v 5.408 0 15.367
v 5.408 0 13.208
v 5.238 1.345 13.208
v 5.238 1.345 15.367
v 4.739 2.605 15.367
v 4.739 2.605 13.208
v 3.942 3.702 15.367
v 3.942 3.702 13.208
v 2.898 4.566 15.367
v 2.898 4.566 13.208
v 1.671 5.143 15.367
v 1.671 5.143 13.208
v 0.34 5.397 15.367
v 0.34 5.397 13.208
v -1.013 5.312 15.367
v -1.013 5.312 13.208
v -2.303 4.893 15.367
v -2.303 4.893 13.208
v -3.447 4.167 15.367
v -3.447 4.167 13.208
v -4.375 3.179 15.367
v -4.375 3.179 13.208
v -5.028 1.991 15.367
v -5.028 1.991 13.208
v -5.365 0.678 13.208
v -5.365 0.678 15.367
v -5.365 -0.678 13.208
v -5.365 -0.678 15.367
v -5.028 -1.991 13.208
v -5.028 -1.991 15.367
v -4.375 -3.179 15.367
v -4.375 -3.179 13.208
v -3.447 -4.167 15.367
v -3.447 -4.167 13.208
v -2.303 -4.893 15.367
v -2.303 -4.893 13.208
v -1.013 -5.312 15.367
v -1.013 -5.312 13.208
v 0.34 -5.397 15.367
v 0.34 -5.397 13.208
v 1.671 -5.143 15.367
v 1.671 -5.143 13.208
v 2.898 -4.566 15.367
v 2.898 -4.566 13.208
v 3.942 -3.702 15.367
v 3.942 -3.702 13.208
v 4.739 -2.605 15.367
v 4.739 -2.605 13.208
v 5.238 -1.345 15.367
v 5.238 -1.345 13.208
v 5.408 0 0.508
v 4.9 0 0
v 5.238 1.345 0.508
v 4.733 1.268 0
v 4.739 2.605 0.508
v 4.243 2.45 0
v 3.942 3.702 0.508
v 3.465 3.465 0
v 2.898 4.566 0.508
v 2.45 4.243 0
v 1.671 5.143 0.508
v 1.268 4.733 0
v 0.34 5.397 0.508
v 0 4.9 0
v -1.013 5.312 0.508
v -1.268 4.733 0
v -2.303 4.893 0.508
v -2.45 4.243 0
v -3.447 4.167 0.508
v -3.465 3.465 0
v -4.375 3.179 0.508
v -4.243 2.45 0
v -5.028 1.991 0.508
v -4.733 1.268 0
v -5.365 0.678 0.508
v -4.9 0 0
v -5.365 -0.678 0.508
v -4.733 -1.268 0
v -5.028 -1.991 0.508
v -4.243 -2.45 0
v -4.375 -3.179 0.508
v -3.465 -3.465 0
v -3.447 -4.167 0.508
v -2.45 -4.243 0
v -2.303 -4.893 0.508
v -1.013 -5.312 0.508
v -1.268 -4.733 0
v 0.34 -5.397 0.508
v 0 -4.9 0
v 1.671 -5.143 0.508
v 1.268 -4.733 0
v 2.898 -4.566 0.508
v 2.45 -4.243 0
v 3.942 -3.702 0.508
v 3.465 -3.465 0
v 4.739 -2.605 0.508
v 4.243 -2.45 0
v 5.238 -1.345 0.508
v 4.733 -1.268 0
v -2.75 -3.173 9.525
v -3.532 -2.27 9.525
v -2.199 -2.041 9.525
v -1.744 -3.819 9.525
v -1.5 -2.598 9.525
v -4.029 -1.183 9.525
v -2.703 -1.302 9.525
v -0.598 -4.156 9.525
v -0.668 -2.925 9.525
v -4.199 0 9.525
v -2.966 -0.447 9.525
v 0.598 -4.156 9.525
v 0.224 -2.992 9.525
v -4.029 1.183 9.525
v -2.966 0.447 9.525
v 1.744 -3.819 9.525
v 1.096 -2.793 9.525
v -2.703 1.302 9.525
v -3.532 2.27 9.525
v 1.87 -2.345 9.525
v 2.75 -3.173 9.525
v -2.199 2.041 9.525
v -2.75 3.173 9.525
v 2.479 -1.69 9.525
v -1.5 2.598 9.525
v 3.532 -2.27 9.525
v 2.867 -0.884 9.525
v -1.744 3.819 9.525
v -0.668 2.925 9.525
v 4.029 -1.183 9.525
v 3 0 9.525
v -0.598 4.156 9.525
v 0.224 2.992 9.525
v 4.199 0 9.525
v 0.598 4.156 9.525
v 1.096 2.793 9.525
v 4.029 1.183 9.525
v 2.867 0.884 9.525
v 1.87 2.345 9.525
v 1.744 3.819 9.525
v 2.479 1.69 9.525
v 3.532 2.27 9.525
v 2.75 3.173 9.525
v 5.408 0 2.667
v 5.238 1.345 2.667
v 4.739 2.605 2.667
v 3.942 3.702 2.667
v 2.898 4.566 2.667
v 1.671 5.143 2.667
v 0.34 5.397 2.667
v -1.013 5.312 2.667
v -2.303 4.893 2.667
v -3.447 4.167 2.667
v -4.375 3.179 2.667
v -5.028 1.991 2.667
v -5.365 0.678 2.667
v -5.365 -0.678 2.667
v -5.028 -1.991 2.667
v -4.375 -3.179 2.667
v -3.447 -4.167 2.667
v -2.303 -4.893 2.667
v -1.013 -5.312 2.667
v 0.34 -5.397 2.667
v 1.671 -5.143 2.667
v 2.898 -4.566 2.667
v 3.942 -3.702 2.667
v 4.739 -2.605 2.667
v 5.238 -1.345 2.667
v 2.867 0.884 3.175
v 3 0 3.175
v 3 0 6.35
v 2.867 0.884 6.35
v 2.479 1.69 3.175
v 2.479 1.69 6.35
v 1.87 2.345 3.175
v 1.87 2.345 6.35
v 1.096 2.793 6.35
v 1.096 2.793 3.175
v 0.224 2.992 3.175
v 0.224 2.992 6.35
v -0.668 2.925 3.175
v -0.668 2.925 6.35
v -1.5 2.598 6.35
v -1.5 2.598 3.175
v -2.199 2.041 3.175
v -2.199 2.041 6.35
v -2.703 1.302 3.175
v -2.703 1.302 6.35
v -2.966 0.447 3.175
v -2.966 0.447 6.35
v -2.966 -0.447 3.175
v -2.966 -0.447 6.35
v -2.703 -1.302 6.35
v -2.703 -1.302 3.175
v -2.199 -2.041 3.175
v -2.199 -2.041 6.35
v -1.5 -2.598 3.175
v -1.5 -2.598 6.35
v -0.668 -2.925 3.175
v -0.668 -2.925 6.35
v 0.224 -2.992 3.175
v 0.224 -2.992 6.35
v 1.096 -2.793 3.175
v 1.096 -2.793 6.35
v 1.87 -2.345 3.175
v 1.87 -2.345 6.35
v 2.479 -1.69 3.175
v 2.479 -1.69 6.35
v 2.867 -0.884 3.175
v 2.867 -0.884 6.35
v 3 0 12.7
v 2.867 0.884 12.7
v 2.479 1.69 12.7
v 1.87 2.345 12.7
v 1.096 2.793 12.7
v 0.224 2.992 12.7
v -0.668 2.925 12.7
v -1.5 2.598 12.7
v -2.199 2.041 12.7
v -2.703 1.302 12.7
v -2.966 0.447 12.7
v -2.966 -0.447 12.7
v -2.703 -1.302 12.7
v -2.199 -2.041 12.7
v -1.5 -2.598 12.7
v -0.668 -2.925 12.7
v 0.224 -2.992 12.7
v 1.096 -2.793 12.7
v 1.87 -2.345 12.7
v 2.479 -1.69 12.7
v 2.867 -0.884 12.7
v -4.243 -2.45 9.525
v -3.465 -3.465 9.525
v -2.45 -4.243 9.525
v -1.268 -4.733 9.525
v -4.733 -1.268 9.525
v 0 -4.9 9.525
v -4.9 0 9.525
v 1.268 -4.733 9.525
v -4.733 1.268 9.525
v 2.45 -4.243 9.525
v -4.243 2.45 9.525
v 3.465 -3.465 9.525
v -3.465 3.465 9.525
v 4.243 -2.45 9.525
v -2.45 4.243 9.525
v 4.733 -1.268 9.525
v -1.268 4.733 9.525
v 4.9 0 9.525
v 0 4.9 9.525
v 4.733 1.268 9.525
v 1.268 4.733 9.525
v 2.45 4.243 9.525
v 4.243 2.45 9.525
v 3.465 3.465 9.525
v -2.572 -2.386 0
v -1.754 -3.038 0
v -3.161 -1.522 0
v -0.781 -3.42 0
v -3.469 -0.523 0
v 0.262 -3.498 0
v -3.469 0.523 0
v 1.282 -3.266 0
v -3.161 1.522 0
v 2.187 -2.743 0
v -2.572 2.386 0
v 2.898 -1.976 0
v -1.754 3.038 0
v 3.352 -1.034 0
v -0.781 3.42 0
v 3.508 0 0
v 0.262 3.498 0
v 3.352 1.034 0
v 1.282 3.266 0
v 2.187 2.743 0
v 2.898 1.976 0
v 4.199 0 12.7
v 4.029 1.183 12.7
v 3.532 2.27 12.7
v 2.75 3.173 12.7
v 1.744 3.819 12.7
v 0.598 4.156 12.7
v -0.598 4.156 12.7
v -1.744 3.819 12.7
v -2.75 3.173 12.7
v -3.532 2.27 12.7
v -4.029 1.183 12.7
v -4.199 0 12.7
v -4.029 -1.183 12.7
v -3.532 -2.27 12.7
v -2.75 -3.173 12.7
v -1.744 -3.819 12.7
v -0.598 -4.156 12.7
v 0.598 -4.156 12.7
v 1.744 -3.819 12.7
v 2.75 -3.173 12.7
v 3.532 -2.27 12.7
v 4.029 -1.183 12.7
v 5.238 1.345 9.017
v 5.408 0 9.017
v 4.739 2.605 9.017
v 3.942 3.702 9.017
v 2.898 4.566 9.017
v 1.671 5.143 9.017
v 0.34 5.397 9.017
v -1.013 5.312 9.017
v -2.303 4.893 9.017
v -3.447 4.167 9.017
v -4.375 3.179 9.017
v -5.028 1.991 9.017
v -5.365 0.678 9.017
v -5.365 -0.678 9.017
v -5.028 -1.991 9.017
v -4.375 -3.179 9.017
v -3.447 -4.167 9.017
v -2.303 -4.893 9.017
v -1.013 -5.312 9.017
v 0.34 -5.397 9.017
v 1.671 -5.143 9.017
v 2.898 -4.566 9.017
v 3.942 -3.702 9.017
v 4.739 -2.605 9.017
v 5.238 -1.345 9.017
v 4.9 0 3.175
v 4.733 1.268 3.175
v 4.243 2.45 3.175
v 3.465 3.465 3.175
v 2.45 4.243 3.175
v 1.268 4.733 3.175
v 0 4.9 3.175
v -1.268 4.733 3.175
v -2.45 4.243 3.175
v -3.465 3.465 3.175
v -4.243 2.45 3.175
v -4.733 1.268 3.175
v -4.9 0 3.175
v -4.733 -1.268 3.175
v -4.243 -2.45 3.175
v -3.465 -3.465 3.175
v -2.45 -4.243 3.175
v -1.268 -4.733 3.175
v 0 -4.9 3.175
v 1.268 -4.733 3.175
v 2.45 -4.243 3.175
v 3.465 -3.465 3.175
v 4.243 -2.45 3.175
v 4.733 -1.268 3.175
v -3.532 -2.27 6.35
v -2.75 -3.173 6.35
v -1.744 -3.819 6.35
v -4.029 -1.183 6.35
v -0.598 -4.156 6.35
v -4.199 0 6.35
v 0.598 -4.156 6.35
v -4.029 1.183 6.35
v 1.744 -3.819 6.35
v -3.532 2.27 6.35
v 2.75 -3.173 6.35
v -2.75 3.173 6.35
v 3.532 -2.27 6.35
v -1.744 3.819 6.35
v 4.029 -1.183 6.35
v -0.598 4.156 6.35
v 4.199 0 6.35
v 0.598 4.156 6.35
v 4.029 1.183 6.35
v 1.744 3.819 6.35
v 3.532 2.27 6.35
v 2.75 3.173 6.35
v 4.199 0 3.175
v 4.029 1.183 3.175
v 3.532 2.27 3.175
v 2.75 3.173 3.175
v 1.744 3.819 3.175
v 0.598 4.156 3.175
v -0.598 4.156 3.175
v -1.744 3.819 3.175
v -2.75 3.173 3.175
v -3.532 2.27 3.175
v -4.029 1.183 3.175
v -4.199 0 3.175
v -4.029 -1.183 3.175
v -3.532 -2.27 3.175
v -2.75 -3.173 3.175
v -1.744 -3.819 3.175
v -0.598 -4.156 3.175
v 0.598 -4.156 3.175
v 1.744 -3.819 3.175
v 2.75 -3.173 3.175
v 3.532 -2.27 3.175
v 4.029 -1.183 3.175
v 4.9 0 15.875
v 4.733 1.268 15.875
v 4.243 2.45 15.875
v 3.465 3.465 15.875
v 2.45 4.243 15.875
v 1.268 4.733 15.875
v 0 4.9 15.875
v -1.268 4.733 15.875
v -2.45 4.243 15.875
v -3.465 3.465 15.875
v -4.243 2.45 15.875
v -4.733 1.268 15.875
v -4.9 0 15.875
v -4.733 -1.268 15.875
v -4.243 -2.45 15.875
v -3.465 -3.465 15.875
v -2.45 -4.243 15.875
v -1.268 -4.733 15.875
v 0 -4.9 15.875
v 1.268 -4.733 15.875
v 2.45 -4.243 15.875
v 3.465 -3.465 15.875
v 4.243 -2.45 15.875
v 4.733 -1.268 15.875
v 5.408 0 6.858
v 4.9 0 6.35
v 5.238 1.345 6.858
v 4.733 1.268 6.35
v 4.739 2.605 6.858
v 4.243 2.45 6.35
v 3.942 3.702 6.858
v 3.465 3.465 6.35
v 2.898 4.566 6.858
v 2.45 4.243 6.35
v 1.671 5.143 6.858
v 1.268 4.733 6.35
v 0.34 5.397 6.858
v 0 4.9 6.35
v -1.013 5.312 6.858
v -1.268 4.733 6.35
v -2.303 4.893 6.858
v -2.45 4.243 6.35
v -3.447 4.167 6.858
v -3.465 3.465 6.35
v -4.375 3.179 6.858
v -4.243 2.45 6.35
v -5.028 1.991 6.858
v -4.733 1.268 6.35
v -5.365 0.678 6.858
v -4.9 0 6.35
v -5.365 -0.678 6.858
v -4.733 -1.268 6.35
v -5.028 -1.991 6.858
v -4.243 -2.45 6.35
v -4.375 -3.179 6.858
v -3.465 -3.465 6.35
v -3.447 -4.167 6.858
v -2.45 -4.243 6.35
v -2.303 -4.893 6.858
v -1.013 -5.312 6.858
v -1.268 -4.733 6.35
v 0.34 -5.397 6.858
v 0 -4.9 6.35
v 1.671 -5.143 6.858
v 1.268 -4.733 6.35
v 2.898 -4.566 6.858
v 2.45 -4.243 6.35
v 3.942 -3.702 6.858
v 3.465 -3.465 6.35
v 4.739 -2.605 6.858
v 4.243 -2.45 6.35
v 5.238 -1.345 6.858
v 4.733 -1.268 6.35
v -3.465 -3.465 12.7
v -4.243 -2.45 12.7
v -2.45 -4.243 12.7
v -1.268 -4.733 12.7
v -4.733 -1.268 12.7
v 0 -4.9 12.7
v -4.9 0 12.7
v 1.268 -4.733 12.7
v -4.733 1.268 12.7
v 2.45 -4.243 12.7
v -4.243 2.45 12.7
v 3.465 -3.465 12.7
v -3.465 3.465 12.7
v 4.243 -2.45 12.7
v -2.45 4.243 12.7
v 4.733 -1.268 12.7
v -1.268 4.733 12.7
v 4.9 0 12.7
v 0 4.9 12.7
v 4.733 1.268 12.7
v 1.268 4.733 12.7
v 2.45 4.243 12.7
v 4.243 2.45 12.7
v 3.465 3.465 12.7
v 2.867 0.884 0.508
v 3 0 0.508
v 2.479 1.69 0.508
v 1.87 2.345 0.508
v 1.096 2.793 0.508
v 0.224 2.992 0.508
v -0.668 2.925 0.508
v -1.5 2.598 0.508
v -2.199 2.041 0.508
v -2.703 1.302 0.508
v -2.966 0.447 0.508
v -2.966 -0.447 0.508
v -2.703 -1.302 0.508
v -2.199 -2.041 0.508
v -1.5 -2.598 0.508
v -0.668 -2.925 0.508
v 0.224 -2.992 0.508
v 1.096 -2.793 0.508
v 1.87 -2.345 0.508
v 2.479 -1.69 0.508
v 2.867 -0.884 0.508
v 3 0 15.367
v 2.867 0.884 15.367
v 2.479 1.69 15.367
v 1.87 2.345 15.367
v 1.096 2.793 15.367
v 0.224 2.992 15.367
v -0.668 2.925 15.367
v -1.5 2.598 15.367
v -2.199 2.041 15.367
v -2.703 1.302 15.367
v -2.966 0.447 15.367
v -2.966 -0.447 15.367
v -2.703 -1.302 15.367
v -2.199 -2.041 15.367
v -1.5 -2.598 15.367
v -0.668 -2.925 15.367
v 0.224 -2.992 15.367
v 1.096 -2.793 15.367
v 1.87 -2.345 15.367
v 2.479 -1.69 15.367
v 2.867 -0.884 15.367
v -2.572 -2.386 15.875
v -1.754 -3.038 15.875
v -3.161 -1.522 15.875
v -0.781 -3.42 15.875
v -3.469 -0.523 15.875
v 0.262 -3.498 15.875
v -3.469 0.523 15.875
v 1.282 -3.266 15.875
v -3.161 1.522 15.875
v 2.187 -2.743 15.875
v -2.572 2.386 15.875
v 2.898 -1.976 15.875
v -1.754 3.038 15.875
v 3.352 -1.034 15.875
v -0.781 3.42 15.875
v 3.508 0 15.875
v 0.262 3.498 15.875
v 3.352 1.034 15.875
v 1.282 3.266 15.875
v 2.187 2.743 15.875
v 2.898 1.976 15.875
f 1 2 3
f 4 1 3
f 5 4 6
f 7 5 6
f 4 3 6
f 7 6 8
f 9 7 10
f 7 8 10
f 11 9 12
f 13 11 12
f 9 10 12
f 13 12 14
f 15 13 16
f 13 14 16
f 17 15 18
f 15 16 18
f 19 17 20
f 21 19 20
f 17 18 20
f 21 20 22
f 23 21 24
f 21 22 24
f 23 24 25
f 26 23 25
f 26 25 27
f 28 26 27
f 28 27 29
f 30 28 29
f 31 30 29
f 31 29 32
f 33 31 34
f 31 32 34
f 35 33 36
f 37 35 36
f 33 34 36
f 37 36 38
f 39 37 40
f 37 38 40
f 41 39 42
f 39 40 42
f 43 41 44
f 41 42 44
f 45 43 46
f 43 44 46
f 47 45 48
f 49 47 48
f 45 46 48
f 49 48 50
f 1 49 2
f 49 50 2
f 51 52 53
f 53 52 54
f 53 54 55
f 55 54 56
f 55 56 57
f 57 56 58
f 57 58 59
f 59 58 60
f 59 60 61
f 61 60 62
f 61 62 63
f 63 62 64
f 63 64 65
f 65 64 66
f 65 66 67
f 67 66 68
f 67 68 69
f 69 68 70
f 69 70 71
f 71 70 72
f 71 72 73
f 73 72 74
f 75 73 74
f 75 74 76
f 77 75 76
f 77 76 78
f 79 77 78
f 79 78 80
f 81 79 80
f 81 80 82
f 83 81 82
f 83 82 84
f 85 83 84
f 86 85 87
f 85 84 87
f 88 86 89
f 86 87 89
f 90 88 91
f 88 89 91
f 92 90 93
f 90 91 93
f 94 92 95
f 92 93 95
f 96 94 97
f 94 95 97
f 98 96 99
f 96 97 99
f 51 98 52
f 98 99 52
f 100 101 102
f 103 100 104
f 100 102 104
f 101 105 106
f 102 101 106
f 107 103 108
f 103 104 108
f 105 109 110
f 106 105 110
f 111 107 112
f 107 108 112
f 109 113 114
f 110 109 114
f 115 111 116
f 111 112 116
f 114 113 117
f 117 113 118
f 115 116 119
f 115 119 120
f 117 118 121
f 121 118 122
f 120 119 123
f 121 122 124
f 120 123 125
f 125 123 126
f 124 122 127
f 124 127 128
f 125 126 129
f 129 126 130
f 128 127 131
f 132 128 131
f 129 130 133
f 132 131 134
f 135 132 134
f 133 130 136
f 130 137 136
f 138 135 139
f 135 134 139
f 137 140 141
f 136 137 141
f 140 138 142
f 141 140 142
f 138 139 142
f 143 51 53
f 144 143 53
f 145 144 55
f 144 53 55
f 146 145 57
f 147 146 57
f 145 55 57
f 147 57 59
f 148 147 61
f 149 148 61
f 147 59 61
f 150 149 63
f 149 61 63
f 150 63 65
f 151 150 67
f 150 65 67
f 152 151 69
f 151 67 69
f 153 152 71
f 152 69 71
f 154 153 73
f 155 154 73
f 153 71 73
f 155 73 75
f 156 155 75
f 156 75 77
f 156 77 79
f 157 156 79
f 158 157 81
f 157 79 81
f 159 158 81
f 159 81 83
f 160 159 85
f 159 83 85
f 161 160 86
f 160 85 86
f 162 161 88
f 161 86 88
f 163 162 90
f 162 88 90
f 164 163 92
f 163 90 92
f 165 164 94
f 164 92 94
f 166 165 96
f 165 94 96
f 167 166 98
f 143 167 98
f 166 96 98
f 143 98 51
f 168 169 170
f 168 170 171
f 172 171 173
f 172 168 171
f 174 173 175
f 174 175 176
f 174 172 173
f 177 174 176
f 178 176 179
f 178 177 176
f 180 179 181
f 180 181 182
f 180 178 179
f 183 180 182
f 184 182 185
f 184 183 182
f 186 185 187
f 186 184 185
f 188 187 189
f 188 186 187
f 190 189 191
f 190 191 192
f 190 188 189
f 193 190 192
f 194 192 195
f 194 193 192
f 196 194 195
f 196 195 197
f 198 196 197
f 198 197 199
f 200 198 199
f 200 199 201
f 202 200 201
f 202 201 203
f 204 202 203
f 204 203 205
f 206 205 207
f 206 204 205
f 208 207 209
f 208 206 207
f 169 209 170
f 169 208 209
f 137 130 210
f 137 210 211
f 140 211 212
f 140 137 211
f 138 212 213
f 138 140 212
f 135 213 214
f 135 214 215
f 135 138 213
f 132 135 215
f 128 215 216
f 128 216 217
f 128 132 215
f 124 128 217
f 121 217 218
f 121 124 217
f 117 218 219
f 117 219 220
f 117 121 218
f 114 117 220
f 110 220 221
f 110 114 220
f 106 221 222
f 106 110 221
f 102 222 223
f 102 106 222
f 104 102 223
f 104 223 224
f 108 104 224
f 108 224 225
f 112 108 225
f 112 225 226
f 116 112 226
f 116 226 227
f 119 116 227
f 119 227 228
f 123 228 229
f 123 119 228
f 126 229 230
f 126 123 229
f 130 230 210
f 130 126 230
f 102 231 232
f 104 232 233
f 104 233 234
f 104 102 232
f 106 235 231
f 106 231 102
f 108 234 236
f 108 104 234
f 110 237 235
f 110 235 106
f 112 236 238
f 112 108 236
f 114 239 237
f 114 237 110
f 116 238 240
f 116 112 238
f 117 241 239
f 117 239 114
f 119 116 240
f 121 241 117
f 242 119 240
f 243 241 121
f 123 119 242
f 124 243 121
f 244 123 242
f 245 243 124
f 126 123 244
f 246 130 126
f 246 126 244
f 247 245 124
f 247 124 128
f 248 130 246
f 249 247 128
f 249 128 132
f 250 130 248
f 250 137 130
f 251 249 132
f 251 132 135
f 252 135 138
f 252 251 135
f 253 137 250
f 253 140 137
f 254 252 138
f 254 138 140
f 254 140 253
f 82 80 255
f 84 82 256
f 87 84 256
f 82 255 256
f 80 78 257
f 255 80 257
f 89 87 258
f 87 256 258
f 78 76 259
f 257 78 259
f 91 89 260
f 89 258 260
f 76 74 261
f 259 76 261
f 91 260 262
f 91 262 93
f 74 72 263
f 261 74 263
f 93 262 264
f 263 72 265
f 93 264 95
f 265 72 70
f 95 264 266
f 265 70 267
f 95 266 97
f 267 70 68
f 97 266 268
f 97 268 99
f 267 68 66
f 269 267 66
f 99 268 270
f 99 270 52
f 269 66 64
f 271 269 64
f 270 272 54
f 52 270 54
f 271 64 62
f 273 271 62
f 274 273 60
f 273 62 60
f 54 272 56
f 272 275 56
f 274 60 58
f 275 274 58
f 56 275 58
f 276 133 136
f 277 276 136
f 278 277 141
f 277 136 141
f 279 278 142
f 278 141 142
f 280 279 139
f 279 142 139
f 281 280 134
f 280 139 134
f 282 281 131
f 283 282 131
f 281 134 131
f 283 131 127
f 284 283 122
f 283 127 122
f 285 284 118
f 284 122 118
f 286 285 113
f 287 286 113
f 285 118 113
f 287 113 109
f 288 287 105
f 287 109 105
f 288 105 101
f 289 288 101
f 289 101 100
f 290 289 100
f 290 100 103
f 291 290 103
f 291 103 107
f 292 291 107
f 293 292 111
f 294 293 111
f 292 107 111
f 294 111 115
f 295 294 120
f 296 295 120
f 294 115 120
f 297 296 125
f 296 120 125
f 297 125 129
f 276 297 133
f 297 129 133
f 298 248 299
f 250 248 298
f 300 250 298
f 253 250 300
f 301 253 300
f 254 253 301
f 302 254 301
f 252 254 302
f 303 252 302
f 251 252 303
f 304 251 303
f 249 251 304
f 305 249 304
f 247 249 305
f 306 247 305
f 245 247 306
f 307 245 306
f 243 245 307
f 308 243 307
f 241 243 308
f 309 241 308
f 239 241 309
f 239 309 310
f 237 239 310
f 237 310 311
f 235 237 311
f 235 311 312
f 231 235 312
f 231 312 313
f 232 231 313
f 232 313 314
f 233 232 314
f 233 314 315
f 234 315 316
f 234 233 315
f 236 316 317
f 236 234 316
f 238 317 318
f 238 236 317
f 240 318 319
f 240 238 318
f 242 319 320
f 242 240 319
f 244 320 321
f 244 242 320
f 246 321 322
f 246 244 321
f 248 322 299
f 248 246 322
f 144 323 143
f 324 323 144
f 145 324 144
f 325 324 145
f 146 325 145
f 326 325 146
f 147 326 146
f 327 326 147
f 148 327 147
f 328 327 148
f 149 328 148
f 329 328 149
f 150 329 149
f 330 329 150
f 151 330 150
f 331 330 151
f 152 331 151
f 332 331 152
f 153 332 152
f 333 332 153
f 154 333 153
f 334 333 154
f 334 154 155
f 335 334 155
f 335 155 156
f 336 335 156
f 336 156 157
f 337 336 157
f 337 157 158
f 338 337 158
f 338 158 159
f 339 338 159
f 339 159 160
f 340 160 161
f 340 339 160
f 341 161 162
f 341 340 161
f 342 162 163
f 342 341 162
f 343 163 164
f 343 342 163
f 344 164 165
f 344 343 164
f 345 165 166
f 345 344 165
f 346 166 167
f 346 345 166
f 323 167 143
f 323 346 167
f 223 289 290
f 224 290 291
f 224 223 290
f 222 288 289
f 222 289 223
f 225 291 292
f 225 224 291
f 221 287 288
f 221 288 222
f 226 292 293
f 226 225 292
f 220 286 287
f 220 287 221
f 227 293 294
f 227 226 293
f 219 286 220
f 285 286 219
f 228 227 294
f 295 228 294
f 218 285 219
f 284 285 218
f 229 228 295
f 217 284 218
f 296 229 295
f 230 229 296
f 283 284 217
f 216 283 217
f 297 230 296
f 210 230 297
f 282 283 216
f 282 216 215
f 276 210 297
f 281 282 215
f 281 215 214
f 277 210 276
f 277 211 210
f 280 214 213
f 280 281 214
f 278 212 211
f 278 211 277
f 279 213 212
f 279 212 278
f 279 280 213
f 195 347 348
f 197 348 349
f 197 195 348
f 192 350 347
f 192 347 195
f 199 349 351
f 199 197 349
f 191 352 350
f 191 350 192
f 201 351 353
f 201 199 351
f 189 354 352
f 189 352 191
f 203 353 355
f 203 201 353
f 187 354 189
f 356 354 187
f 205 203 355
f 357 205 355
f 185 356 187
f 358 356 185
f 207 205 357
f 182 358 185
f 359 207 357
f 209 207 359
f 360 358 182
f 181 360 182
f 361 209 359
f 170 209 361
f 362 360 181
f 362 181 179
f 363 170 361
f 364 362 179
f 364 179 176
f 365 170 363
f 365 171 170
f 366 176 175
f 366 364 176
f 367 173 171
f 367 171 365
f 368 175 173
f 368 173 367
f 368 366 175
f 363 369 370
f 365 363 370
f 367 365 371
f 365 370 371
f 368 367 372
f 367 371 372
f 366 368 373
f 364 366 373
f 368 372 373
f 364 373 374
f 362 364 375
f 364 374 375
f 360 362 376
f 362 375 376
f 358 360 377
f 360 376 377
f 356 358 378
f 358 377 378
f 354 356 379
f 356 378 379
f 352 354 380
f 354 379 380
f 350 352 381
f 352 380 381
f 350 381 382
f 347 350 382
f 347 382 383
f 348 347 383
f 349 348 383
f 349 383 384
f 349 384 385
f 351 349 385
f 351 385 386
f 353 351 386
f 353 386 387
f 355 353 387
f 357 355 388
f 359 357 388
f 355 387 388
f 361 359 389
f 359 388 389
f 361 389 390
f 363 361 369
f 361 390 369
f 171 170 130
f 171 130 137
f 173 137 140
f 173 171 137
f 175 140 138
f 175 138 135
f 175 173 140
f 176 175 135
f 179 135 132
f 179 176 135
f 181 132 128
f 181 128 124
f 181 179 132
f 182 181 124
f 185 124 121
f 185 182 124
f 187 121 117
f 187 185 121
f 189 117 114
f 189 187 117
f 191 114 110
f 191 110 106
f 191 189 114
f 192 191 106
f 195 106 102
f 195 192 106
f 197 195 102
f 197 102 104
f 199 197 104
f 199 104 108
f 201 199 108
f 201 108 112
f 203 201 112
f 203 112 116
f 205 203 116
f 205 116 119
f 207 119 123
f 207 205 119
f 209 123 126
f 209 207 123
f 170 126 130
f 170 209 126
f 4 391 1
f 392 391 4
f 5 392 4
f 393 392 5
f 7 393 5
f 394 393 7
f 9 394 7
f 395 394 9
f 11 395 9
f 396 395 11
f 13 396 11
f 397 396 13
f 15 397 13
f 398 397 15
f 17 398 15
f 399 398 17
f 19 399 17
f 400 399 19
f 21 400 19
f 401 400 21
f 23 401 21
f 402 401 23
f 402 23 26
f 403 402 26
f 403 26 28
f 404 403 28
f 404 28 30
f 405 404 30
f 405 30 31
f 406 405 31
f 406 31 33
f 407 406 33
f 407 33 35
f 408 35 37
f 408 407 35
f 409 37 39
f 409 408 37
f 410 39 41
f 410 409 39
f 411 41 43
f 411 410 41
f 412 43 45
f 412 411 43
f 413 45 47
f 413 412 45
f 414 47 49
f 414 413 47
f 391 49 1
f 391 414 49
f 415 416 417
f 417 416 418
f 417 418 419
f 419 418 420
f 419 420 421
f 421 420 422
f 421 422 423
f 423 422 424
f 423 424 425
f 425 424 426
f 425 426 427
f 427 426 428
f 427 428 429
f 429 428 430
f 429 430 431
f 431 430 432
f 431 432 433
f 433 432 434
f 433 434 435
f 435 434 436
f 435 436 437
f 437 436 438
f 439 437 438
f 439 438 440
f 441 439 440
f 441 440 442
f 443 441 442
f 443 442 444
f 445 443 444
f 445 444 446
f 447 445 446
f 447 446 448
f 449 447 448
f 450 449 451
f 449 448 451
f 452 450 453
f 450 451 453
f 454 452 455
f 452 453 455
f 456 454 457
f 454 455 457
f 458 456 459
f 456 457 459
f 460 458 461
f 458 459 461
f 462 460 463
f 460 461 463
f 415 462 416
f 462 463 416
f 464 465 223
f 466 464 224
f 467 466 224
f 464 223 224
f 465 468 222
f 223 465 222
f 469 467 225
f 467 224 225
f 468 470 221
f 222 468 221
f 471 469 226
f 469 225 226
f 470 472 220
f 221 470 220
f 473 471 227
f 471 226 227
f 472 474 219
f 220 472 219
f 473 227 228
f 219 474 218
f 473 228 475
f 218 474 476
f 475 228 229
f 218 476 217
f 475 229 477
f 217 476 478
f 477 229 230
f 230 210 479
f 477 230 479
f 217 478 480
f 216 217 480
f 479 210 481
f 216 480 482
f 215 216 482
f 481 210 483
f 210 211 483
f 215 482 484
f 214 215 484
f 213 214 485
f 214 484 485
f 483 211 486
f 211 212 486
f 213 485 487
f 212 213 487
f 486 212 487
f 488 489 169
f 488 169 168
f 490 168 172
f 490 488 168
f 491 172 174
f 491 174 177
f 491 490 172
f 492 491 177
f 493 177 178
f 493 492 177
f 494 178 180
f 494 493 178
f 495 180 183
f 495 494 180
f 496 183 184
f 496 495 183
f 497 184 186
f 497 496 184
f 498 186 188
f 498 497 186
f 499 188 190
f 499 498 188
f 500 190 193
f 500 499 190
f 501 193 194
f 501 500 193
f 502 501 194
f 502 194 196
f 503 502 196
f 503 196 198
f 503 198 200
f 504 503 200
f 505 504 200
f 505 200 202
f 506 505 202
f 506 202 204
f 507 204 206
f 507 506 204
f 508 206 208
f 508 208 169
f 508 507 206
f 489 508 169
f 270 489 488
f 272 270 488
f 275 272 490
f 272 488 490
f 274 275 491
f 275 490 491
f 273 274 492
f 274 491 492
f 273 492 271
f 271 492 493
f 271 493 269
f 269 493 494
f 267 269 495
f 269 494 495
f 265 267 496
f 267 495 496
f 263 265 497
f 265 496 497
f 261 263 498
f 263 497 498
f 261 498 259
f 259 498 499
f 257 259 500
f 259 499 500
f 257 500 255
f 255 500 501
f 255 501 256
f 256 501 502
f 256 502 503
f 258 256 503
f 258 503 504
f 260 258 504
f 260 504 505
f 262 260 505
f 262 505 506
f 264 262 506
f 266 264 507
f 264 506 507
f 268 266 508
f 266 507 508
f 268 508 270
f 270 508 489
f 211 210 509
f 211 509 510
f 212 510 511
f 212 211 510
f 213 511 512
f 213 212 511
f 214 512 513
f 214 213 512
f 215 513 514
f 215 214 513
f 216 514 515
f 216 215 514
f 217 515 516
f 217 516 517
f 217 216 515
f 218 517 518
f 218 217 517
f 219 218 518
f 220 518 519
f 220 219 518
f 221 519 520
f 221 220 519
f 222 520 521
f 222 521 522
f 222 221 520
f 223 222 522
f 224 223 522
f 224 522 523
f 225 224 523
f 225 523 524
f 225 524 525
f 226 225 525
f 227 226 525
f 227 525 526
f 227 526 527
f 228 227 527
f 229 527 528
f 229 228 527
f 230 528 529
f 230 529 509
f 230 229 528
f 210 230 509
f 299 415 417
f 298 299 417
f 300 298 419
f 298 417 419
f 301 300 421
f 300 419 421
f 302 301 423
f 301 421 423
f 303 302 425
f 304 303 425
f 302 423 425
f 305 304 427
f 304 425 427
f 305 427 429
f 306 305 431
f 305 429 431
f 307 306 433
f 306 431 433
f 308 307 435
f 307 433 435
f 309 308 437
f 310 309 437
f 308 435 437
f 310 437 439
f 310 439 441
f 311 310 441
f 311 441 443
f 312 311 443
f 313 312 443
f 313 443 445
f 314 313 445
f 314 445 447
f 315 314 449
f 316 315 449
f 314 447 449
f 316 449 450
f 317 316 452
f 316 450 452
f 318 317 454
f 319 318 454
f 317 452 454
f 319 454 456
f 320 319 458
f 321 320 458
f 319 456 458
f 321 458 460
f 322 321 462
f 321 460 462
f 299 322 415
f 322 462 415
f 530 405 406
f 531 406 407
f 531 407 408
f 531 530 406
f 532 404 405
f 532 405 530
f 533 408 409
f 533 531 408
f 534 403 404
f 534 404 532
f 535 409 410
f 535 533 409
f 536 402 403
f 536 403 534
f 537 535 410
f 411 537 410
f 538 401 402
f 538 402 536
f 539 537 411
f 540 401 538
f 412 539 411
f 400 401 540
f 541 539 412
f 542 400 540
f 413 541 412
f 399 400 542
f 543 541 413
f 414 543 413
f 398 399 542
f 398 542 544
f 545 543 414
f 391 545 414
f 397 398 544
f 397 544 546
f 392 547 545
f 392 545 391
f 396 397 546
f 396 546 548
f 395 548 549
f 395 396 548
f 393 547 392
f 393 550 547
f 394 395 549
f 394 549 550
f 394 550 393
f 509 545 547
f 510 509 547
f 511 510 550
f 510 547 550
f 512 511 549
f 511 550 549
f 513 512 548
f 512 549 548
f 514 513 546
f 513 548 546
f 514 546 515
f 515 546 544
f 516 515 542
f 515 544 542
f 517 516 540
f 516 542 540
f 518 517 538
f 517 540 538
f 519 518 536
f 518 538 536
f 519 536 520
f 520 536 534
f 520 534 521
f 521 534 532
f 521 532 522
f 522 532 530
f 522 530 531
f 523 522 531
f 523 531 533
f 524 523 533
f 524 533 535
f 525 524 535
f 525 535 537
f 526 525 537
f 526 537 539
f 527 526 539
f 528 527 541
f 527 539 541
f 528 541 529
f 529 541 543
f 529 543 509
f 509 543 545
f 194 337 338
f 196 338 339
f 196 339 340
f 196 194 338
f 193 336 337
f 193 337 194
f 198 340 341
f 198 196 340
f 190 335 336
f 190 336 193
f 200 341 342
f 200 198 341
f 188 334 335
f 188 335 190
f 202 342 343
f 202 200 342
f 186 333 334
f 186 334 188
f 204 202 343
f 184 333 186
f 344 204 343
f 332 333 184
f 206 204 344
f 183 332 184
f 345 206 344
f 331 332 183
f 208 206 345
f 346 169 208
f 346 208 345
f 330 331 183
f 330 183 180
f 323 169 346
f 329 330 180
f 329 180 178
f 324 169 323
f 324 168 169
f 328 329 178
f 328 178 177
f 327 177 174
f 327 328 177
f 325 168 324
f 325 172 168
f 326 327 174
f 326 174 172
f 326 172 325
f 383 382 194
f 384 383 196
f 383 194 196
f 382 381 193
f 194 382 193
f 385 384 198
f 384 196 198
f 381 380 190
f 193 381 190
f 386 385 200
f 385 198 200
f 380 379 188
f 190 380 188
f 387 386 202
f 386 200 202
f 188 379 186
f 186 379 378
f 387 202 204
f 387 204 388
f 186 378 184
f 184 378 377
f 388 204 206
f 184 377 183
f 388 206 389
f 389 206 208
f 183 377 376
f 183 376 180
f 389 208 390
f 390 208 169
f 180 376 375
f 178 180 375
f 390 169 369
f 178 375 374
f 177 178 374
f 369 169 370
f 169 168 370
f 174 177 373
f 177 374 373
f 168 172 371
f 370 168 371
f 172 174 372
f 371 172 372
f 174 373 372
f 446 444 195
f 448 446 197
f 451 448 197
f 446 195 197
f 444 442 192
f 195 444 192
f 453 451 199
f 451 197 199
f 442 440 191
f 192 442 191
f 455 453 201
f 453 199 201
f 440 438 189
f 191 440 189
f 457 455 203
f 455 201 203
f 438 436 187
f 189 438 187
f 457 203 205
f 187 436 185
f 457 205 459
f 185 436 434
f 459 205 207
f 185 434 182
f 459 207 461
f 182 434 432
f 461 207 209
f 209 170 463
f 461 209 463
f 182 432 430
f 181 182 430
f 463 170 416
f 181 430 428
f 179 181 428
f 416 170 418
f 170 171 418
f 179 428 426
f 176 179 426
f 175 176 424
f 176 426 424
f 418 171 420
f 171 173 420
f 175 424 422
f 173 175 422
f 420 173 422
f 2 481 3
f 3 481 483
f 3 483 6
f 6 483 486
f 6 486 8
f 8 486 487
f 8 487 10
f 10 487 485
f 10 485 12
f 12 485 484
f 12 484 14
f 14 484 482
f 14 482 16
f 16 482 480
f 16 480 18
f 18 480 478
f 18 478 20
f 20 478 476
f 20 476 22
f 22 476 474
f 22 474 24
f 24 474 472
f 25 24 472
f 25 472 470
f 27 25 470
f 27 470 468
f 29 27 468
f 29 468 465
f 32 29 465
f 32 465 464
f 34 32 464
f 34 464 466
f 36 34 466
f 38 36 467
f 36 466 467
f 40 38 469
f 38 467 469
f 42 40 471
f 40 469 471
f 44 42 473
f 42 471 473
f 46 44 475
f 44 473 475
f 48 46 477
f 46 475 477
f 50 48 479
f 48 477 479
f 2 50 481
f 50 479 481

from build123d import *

# Parameters (mm, degrees)
F0_R       = 5.4077606055
F0_R_2     = 4.1986607111
F0_R_3     = 3
F1_DEPTH   = 3.175
F3_DEPTH   = 3.175
F5_DEPTH   = 3.175
F7_DEPTH   = 3.175
F9_DEPTH   = 3.175
F14_SIZE   = 0.508
F14_2_SIZE = 0.508
F14_3_SIZE = 0.508
F15_SIZE   = 0.508
F15_2_SIZE = 0.508


with BuildPart() as f1:
    # F0 (on Top) → F1 (new body)
    with BuildSketch(Plane.XY):
        Circle(F0_R)
        Circle(F0_R_2, mode=Mode.SUBTRACT)
        Circle(F0_R_2)
        Circle(F0_R_3, mode=Mode.SUBTRACT)
    extrude(amount=F1_DEPTH)


with BuildPart() as f1_1:
    # F2: moved
    add(f1.part.moved(Location((0, 0, 15.875))))


with BuildPart() as f3:
    # F0 (on Top) → F3 (new body)
    with BuildSketch(Plane.XY):
        Circle(F0_R_2)
        Circle(F0_R_3, mode=Mode.SUBTRACT)
    extrude(amount=F3_DEPTH)


with BuildPart() as f3_1:
    # F4: moved
    add(f3.part.moved(Location((0, 0, 12.7))))


with BuildPart() as f5:
    # F0 (on Top) → F5 (new body)
    with BuildSketch(Plane.XY):
        Circle(F0_R)
        Circle(F0_R_2, mode=Mode.SUBTRACT)
        Circle(F0_R_2)
        Circle(F0_R_3, mode=Mode.SUBTRACT)
    extrude(amount=F5_DEPTH)


with BuildPart() as f5_1:
    # F6: moved
    add(f5.part.moved(Location((0, 0, 9.525))))


with BuildPart() as f7:
    # F0 (on Top) → F7 (new body)
    with BuildSketch(Plane.XY):
        Circle(F0_R_2)
        Circle(F0_R_3, mode=Mode.SUBTRACT)
    extrude(amount=F7_DEPTH)


with BuildPart() as f7_1:
    # F8: moved
    add(f7.part.moved(Location((0, 0, 6.35))))


with BuildPart() as f9:
    # F0 (on Top) → F9 (new body)
    with BuildSketch(Plane.XY):
        Circle(F0_R)
        Circle(F0_R_2, mode=Mode.SUBTRACT)
        Circle(F0_R_2)
        Circle(F0_R_3, mode=Mode.SUBTRACT)
    extrude(amount=F9_DEPTH)

    # F14#3
    f14_3_edges = [f9.edges().sort_by_distance(p)[0] for p in [
        (-5.407761, 0, 3.175),
        (-5.407761, 0, 0),
    ]]
    chamfer(f14_3_edges, length=F14_3_SIZE)

    # F15
    f15_edges = [f9.edges().sort_by_distance(p)[0] for p in [
        (-3, 0, 0),
    ]]
    chamfer(f15_edges, length=F15_SIZE)


with BuildPart() as f7_2:
    # F10: moved
    add(f7_1.part.moved(Location((0, 0, -3.175))))


with BuildPart() as f5_2:
    # F11: moved
    add(f5_1.part.moved(Location((0, 0, -3.175))))

    # F14#2
    f14_2_edges = [f5_2.edges().sort_by_distance(p)[0] for p in [
        (-5.407761, 0, 9.525),
        (-5.407761, 0, 6.35),
    ]]
    chamfer(f14_2_edges, length=F14_2_SIZE)


with BuildPart() as f3_2:
    # F12: moved
    add(f3_1.part.moved(Location((0, 0, -3.175))))


with BuildPart() as f1_2:
    # F13: moved
    add(f1_1.part.moved(Location((0, 0, -3.175))))

    # F14
    f14_edges = [f1_2.edges().sort_by_distance(p)[0] for p in [
        (-3, 0, 15.875),
        (-5.407761, 0, 15.875),
    ]]
    chamfer(f14_edges, length=F14_SIZE)

    # F15#2
    f15_2_edges = [f1_2.edges().sort_by_distance(p)[0] for p in [
        (-5.407761, 0, 12.7),
    ]]
    chamfer(f15_2_edges, length=F15_2_SIZE)


solid = Compound([f9.part, f7_2.part, f5_2.part, f3_2.part, f1_2.part])
